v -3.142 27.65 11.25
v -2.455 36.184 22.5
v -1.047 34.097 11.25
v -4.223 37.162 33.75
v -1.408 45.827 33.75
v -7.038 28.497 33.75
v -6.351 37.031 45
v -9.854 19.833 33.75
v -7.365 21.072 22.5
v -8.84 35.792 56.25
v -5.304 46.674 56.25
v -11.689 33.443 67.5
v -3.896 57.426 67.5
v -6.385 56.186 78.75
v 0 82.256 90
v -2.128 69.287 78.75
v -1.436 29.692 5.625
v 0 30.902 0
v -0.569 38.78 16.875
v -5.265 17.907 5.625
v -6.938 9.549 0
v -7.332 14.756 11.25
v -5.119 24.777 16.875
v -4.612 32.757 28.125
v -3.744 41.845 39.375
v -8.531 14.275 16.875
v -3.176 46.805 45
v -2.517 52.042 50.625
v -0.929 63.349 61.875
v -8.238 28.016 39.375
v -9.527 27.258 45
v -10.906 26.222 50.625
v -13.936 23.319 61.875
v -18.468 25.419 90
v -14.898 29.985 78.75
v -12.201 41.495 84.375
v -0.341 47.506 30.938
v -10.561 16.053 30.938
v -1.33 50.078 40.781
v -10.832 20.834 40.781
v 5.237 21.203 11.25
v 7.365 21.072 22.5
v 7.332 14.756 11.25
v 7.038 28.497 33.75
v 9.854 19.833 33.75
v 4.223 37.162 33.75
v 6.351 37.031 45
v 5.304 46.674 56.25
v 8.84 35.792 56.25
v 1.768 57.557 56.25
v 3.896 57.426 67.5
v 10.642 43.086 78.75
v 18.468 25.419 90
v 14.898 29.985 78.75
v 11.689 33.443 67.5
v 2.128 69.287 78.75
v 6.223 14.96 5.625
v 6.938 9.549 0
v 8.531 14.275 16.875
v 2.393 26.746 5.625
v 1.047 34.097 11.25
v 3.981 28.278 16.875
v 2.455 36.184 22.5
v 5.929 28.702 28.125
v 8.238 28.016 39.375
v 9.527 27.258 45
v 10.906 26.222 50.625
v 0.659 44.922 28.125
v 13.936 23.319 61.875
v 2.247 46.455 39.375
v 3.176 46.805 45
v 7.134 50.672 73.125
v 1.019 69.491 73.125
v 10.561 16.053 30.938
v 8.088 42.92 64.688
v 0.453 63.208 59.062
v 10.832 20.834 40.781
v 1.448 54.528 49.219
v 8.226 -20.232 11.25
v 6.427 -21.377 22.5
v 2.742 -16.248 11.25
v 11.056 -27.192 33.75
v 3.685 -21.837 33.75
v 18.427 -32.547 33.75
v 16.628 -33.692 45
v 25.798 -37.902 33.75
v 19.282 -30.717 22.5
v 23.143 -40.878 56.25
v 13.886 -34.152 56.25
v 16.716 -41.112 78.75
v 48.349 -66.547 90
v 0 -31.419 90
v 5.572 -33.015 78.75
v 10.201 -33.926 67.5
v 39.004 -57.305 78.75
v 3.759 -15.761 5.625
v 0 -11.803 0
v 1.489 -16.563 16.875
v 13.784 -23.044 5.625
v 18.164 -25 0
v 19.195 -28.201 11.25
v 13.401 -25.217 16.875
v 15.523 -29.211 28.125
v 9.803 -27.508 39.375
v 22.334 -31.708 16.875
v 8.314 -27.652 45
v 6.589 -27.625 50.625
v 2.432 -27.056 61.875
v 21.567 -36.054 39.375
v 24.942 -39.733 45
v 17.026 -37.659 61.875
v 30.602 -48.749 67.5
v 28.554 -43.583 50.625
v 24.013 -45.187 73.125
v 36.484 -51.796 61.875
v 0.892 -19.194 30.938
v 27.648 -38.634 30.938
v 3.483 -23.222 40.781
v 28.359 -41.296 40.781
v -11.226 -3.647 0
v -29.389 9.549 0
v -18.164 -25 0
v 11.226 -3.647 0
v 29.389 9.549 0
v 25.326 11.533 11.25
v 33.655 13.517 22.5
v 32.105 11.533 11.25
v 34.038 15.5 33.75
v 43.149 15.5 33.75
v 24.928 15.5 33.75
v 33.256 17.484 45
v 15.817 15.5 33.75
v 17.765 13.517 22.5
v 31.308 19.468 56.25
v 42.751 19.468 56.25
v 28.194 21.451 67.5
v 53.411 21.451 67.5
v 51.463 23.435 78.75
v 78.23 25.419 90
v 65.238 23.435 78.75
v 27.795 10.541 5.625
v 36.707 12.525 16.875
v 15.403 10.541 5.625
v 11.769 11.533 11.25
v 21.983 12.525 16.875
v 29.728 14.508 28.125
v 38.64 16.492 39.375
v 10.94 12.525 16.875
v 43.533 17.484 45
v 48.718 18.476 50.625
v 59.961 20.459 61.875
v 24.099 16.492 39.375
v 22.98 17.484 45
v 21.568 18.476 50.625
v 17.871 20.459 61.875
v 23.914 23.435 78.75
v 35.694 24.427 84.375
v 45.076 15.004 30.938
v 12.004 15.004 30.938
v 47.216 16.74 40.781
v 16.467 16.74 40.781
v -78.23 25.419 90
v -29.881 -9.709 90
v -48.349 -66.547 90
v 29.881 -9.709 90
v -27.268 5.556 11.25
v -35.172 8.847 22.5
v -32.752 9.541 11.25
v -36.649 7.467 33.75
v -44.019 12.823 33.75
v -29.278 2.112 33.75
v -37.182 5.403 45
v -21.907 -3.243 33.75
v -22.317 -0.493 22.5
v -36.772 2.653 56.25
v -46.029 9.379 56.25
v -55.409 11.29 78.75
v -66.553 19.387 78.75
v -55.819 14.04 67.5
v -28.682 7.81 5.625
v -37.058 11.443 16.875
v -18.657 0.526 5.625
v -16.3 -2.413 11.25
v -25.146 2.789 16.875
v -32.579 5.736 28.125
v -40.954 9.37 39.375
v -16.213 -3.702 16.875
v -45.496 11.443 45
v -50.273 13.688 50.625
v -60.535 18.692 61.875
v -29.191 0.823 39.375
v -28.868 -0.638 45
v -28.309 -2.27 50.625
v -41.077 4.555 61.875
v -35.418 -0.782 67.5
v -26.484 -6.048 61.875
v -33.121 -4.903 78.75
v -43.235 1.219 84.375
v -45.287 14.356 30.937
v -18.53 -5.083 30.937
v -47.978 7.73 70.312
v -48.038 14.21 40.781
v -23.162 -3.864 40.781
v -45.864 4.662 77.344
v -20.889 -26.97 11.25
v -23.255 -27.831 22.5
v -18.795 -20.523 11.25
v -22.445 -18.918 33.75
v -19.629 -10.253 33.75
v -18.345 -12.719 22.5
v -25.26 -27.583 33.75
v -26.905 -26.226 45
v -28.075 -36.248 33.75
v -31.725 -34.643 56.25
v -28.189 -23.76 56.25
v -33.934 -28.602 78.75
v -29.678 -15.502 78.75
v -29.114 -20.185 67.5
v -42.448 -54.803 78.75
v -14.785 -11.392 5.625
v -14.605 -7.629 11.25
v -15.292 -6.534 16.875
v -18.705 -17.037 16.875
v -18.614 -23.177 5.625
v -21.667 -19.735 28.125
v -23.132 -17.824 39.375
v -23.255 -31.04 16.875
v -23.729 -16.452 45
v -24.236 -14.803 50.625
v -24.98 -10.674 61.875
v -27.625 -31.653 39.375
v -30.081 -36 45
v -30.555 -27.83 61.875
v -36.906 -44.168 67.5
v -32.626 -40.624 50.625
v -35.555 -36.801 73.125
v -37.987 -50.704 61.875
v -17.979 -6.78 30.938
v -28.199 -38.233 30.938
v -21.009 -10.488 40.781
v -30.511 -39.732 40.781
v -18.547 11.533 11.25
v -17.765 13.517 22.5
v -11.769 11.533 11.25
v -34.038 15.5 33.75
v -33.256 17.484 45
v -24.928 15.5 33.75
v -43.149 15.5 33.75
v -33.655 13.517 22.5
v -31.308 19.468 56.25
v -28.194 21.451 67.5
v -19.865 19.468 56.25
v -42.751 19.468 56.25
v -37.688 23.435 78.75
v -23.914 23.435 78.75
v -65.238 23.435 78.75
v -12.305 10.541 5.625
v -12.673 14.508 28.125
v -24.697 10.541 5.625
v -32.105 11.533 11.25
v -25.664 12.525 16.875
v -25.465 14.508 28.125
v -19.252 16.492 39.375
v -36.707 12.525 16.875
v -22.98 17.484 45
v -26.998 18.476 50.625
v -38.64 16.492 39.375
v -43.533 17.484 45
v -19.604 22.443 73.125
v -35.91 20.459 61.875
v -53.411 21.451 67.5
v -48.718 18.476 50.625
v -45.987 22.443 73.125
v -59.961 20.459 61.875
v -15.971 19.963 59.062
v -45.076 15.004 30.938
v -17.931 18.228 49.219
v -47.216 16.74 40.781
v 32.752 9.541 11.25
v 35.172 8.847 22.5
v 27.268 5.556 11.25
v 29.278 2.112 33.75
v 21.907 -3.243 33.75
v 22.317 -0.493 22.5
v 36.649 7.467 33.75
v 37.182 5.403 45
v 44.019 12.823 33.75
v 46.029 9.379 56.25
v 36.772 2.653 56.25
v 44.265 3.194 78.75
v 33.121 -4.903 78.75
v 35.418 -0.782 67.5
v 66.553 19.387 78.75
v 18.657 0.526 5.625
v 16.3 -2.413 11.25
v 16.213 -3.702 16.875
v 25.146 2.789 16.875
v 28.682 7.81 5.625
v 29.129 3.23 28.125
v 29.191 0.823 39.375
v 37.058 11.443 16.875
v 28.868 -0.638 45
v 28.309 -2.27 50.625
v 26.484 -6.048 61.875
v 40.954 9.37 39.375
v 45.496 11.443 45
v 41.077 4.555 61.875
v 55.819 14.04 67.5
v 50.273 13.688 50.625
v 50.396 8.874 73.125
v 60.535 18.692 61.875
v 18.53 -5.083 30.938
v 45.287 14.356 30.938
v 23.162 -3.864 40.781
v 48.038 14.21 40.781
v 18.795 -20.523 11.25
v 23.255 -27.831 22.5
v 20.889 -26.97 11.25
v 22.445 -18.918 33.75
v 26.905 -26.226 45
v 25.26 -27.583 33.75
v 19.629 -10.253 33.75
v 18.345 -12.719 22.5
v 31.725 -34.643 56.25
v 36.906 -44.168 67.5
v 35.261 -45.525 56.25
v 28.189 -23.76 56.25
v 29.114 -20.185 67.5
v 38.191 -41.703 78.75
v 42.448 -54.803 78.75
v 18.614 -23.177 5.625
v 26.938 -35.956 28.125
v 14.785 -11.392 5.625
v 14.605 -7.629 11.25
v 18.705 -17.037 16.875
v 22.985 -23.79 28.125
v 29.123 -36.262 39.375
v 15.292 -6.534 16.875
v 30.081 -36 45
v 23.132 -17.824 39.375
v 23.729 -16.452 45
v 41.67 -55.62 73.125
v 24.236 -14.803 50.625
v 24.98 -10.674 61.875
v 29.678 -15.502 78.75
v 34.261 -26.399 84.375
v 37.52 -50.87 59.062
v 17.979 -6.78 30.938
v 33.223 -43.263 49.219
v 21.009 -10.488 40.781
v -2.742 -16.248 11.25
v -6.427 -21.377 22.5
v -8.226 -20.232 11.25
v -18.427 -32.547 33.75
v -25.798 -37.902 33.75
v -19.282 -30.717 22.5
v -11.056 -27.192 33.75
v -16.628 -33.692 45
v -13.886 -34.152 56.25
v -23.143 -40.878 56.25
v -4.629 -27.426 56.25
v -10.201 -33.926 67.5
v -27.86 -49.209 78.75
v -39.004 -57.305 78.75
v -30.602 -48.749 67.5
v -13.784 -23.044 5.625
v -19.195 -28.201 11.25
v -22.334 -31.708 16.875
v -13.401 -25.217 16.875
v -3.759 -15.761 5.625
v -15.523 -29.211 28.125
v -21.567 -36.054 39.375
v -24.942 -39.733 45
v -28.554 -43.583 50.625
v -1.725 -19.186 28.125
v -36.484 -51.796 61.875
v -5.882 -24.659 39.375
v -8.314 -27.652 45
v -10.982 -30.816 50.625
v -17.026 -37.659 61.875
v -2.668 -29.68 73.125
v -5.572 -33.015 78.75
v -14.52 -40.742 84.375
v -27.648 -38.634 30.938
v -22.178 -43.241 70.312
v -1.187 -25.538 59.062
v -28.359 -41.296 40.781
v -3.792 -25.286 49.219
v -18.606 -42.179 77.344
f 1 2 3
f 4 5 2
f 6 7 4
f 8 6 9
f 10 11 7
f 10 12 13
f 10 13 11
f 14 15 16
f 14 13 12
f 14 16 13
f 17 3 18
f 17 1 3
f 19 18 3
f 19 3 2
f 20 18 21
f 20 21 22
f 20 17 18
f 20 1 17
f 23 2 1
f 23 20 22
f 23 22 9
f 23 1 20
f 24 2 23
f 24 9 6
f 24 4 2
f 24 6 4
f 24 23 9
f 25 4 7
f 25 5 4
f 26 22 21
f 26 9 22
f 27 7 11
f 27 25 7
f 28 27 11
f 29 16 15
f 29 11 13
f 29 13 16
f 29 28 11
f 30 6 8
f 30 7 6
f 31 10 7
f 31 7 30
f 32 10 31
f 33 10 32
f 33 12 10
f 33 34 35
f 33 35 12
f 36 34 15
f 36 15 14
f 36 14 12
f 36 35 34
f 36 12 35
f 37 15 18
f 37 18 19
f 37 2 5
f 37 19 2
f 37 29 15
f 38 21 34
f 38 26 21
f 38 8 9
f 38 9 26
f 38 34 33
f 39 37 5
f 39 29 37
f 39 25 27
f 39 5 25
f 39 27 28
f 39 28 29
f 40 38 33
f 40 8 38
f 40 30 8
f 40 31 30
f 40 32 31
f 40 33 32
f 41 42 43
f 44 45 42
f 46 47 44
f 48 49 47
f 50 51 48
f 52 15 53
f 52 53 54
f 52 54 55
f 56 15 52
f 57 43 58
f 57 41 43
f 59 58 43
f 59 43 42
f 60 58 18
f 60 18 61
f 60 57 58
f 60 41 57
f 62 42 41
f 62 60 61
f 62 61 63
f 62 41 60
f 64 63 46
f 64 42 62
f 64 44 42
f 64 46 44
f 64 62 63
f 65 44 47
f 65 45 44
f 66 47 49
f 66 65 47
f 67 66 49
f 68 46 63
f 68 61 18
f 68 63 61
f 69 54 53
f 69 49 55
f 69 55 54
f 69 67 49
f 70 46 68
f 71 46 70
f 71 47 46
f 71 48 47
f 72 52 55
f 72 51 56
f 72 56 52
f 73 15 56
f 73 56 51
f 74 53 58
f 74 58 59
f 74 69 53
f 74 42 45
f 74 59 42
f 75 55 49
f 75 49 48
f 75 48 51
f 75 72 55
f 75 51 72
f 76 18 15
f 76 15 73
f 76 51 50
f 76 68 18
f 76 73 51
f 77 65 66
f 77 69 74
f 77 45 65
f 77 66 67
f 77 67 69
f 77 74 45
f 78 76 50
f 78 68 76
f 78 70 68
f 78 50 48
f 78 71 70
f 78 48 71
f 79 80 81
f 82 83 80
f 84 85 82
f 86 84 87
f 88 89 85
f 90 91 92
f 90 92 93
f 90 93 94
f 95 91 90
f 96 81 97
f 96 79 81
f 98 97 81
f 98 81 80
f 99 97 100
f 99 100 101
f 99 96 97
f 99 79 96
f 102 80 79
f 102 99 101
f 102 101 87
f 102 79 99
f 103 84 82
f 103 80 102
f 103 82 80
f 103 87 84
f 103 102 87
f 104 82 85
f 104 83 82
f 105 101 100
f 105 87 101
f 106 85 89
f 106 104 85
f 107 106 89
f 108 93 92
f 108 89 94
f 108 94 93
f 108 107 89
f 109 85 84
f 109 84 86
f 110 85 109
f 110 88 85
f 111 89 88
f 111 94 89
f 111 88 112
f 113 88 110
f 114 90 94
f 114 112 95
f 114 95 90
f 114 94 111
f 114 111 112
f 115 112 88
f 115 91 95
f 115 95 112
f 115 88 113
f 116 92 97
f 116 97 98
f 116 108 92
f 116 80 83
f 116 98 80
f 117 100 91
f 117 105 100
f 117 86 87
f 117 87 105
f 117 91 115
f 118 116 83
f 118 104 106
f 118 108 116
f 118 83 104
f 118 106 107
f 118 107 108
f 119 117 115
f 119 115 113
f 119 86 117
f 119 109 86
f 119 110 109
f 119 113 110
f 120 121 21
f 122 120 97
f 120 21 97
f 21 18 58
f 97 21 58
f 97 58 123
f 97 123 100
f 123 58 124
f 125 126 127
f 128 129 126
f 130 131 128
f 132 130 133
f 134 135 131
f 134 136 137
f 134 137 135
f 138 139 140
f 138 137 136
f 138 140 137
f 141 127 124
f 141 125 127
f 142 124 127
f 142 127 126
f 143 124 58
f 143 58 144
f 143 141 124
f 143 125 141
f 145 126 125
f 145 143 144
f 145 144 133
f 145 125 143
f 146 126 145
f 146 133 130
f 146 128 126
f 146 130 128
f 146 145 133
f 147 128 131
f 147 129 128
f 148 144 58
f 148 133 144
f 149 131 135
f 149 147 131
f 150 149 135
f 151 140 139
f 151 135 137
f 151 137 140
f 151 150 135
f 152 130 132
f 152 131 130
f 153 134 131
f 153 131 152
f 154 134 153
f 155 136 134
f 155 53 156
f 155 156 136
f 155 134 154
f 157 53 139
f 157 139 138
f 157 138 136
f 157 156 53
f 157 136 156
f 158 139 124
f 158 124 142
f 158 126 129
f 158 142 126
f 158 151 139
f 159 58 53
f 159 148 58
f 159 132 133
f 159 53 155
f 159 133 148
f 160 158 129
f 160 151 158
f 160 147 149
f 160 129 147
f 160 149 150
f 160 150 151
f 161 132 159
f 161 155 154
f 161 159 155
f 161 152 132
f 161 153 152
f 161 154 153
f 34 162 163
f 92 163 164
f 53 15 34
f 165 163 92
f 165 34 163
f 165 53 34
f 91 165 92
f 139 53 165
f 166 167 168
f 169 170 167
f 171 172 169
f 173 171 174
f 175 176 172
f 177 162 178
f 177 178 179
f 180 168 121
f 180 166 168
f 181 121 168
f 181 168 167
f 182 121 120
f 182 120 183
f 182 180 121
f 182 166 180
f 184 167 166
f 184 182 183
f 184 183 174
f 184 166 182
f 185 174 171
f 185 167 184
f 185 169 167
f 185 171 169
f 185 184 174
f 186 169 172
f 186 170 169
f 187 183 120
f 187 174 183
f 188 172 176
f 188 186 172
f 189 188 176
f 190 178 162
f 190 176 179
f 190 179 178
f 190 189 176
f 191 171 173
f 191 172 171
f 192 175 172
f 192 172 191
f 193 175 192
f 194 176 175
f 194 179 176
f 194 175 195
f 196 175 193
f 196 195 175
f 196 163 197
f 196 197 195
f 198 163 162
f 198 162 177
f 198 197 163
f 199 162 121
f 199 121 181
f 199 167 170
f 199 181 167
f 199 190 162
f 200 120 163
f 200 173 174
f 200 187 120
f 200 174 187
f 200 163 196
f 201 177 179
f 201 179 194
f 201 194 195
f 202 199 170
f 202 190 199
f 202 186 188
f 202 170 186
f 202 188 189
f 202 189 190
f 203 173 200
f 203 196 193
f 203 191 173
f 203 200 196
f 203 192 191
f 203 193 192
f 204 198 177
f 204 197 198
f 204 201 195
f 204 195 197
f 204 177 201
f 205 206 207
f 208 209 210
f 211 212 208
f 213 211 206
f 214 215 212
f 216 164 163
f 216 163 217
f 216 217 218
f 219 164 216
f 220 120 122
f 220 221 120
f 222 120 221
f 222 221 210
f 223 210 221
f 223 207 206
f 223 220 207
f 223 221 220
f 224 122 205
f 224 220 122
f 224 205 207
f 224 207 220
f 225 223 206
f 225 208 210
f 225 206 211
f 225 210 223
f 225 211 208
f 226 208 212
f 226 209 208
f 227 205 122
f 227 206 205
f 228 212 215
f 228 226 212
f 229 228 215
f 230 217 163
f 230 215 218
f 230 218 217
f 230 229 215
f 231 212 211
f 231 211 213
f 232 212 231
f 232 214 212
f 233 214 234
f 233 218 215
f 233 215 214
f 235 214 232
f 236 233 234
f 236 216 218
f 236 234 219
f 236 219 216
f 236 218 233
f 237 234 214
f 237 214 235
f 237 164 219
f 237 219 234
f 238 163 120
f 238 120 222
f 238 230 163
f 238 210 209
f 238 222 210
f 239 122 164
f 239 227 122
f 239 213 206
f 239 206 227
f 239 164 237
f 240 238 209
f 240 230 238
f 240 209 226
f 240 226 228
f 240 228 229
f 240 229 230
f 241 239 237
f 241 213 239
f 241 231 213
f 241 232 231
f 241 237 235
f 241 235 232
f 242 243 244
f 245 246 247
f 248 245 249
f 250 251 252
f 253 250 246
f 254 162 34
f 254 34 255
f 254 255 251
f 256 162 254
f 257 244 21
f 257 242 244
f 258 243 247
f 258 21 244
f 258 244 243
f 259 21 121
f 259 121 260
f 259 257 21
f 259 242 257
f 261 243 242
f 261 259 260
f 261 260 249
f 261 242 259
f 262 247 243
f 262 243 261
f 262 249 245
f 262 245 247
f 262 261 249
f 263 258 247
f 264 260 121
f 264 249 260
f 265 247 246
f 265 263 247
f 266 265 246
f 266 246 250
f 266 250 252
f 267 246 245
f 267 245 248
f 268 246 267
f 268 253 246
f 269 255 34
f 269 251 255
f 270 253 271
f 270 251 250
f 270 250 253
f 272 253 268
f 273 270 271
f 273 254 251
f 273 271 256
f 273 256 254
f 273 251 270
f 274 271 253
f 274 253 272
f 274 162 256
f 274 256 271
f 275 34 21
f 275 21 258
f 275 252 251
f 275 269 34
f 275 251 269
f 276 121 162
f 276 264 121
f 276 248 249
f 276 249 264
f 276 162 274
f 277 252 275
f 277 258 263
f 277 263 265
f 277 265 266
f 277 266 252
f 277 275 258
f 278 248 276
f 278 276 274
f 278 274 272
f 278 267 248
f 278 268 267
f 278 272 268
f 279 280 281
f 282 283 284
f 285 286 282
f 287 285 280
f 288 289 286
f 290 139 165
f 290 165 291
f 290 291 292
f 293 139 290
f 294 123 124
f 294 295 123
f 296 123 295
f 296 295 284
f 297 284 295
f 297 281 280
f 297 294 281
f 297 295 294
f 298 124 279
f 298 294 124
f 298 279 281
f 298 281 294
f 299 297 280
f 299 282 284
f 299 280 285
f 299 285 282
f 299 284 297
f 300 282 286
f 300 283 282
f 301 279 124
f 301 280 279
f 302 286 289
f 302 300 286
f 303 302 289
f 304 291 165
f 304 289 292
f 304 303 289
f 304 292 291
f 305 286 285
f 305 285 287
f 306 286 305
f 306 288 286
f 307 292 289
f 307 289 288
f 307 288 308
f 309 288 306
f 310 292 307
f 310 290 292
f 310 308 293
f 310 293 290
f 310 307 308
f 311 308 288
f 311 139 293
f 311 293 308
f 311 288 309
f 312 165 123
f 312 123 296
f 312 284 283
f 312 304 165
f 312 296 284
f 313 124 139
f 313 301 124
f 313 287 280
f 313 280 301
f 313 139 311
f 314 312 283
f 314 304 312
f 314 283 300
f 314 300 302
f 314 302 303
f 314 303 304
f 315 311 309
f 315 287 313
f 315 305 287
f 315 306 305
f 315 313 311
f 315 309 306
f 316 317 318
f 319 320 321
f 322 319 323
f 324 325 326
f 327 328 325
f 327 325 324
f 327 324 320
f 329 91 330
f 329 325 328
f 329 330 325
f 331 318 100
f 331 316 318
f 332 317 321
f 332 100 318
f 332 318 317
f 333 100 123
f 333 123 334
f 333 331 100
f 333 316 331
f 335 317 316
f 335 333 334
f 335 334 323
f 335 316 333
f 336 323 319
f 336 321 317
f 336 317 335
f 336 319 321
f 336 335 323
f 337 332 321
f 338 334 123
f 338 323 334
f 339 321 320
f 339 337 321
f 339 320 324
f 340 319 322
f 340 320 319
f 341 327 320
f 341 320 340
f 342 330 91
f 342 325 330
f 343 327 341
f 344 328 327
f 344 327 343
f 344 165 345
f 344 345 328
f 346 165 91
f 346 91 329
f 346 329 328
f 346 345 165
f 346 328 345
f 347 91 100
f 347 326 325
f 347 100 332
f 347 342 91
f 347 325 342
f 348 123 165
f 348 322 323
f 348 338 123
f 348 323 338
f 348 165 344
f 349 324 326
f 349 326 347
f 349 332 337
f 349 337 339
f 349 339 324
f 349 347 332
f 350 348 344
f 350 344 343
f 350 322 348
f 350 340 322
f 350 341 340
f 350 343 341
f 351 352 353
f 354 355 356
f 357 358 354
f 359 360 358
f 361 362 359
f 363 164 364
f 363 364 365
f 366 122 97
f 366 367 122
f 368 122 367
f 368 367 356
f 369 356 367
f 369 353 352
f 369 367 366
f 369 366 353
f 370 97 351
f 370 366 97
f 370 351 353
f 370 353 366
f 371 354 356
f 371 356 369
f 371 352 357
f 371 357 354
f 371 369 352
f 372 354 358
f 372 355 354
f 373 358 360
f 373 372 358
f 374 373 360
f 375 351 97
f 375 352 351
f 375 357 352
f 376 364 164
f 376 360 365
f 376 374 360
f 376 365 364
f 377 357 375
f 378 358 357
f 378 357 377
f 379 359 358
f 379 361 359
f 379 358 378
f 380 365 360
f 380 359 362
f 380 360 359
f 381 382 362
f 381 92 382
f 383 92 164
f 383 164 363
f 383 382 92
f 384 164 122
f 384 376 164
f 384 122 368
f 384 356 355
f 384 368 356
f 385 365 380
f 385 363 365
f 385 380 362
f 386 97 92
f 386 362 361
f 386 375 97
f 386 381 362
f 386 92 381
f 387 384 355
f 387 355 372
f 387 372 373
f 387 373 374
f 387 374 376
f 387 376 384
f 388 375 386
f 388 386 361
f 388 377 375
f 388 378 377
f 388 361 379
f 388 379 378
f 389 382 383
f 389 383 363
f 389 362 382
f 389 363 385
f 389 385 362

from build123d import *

# Parameters (mm, degrees)
F2_DEPTH = 90
F2_TAPER = -10


with BuildPart() as f2:
    # F0 (on Top) → F2 (new body)
    with BuildSketch(Plane.XY):
        Polygon((-6.9378637856, 9.5491502813), (-29.3892626146, 9.5491502813), (-11.2256994145, -3.6474508438), align=None)
        Polygon((0, -11.803398875), (-11.2256994145, -3.6474508438), (-18.1635632001, -25), align=None)
        Polygon((11.2256994145, -3.6474508438), (0, -11.803398875), (18.1635632001, -25), align=None)
        Polygon((6.9378637856, 9.5491502813), (-6.9378637856, 9.5491502813), (-11.2256994145, -3.6474508438), (0, -11.803398875), (11.2256994145, -3.6474508438), align=None)
        Polygon((29.3892626146, 9.5491502813), (6.9378637856, 9.5491502813), (11.2256994145, -3.6474508438), align=None)
        Polygon((0, 30.9016994375), (-6.9378637856, 9.5491502813), (6.9378637856, 9.5491502813), align=None)
    extrude(amount=F2_DEPTH, taper=F2_TAPER)


solid = f2.part
